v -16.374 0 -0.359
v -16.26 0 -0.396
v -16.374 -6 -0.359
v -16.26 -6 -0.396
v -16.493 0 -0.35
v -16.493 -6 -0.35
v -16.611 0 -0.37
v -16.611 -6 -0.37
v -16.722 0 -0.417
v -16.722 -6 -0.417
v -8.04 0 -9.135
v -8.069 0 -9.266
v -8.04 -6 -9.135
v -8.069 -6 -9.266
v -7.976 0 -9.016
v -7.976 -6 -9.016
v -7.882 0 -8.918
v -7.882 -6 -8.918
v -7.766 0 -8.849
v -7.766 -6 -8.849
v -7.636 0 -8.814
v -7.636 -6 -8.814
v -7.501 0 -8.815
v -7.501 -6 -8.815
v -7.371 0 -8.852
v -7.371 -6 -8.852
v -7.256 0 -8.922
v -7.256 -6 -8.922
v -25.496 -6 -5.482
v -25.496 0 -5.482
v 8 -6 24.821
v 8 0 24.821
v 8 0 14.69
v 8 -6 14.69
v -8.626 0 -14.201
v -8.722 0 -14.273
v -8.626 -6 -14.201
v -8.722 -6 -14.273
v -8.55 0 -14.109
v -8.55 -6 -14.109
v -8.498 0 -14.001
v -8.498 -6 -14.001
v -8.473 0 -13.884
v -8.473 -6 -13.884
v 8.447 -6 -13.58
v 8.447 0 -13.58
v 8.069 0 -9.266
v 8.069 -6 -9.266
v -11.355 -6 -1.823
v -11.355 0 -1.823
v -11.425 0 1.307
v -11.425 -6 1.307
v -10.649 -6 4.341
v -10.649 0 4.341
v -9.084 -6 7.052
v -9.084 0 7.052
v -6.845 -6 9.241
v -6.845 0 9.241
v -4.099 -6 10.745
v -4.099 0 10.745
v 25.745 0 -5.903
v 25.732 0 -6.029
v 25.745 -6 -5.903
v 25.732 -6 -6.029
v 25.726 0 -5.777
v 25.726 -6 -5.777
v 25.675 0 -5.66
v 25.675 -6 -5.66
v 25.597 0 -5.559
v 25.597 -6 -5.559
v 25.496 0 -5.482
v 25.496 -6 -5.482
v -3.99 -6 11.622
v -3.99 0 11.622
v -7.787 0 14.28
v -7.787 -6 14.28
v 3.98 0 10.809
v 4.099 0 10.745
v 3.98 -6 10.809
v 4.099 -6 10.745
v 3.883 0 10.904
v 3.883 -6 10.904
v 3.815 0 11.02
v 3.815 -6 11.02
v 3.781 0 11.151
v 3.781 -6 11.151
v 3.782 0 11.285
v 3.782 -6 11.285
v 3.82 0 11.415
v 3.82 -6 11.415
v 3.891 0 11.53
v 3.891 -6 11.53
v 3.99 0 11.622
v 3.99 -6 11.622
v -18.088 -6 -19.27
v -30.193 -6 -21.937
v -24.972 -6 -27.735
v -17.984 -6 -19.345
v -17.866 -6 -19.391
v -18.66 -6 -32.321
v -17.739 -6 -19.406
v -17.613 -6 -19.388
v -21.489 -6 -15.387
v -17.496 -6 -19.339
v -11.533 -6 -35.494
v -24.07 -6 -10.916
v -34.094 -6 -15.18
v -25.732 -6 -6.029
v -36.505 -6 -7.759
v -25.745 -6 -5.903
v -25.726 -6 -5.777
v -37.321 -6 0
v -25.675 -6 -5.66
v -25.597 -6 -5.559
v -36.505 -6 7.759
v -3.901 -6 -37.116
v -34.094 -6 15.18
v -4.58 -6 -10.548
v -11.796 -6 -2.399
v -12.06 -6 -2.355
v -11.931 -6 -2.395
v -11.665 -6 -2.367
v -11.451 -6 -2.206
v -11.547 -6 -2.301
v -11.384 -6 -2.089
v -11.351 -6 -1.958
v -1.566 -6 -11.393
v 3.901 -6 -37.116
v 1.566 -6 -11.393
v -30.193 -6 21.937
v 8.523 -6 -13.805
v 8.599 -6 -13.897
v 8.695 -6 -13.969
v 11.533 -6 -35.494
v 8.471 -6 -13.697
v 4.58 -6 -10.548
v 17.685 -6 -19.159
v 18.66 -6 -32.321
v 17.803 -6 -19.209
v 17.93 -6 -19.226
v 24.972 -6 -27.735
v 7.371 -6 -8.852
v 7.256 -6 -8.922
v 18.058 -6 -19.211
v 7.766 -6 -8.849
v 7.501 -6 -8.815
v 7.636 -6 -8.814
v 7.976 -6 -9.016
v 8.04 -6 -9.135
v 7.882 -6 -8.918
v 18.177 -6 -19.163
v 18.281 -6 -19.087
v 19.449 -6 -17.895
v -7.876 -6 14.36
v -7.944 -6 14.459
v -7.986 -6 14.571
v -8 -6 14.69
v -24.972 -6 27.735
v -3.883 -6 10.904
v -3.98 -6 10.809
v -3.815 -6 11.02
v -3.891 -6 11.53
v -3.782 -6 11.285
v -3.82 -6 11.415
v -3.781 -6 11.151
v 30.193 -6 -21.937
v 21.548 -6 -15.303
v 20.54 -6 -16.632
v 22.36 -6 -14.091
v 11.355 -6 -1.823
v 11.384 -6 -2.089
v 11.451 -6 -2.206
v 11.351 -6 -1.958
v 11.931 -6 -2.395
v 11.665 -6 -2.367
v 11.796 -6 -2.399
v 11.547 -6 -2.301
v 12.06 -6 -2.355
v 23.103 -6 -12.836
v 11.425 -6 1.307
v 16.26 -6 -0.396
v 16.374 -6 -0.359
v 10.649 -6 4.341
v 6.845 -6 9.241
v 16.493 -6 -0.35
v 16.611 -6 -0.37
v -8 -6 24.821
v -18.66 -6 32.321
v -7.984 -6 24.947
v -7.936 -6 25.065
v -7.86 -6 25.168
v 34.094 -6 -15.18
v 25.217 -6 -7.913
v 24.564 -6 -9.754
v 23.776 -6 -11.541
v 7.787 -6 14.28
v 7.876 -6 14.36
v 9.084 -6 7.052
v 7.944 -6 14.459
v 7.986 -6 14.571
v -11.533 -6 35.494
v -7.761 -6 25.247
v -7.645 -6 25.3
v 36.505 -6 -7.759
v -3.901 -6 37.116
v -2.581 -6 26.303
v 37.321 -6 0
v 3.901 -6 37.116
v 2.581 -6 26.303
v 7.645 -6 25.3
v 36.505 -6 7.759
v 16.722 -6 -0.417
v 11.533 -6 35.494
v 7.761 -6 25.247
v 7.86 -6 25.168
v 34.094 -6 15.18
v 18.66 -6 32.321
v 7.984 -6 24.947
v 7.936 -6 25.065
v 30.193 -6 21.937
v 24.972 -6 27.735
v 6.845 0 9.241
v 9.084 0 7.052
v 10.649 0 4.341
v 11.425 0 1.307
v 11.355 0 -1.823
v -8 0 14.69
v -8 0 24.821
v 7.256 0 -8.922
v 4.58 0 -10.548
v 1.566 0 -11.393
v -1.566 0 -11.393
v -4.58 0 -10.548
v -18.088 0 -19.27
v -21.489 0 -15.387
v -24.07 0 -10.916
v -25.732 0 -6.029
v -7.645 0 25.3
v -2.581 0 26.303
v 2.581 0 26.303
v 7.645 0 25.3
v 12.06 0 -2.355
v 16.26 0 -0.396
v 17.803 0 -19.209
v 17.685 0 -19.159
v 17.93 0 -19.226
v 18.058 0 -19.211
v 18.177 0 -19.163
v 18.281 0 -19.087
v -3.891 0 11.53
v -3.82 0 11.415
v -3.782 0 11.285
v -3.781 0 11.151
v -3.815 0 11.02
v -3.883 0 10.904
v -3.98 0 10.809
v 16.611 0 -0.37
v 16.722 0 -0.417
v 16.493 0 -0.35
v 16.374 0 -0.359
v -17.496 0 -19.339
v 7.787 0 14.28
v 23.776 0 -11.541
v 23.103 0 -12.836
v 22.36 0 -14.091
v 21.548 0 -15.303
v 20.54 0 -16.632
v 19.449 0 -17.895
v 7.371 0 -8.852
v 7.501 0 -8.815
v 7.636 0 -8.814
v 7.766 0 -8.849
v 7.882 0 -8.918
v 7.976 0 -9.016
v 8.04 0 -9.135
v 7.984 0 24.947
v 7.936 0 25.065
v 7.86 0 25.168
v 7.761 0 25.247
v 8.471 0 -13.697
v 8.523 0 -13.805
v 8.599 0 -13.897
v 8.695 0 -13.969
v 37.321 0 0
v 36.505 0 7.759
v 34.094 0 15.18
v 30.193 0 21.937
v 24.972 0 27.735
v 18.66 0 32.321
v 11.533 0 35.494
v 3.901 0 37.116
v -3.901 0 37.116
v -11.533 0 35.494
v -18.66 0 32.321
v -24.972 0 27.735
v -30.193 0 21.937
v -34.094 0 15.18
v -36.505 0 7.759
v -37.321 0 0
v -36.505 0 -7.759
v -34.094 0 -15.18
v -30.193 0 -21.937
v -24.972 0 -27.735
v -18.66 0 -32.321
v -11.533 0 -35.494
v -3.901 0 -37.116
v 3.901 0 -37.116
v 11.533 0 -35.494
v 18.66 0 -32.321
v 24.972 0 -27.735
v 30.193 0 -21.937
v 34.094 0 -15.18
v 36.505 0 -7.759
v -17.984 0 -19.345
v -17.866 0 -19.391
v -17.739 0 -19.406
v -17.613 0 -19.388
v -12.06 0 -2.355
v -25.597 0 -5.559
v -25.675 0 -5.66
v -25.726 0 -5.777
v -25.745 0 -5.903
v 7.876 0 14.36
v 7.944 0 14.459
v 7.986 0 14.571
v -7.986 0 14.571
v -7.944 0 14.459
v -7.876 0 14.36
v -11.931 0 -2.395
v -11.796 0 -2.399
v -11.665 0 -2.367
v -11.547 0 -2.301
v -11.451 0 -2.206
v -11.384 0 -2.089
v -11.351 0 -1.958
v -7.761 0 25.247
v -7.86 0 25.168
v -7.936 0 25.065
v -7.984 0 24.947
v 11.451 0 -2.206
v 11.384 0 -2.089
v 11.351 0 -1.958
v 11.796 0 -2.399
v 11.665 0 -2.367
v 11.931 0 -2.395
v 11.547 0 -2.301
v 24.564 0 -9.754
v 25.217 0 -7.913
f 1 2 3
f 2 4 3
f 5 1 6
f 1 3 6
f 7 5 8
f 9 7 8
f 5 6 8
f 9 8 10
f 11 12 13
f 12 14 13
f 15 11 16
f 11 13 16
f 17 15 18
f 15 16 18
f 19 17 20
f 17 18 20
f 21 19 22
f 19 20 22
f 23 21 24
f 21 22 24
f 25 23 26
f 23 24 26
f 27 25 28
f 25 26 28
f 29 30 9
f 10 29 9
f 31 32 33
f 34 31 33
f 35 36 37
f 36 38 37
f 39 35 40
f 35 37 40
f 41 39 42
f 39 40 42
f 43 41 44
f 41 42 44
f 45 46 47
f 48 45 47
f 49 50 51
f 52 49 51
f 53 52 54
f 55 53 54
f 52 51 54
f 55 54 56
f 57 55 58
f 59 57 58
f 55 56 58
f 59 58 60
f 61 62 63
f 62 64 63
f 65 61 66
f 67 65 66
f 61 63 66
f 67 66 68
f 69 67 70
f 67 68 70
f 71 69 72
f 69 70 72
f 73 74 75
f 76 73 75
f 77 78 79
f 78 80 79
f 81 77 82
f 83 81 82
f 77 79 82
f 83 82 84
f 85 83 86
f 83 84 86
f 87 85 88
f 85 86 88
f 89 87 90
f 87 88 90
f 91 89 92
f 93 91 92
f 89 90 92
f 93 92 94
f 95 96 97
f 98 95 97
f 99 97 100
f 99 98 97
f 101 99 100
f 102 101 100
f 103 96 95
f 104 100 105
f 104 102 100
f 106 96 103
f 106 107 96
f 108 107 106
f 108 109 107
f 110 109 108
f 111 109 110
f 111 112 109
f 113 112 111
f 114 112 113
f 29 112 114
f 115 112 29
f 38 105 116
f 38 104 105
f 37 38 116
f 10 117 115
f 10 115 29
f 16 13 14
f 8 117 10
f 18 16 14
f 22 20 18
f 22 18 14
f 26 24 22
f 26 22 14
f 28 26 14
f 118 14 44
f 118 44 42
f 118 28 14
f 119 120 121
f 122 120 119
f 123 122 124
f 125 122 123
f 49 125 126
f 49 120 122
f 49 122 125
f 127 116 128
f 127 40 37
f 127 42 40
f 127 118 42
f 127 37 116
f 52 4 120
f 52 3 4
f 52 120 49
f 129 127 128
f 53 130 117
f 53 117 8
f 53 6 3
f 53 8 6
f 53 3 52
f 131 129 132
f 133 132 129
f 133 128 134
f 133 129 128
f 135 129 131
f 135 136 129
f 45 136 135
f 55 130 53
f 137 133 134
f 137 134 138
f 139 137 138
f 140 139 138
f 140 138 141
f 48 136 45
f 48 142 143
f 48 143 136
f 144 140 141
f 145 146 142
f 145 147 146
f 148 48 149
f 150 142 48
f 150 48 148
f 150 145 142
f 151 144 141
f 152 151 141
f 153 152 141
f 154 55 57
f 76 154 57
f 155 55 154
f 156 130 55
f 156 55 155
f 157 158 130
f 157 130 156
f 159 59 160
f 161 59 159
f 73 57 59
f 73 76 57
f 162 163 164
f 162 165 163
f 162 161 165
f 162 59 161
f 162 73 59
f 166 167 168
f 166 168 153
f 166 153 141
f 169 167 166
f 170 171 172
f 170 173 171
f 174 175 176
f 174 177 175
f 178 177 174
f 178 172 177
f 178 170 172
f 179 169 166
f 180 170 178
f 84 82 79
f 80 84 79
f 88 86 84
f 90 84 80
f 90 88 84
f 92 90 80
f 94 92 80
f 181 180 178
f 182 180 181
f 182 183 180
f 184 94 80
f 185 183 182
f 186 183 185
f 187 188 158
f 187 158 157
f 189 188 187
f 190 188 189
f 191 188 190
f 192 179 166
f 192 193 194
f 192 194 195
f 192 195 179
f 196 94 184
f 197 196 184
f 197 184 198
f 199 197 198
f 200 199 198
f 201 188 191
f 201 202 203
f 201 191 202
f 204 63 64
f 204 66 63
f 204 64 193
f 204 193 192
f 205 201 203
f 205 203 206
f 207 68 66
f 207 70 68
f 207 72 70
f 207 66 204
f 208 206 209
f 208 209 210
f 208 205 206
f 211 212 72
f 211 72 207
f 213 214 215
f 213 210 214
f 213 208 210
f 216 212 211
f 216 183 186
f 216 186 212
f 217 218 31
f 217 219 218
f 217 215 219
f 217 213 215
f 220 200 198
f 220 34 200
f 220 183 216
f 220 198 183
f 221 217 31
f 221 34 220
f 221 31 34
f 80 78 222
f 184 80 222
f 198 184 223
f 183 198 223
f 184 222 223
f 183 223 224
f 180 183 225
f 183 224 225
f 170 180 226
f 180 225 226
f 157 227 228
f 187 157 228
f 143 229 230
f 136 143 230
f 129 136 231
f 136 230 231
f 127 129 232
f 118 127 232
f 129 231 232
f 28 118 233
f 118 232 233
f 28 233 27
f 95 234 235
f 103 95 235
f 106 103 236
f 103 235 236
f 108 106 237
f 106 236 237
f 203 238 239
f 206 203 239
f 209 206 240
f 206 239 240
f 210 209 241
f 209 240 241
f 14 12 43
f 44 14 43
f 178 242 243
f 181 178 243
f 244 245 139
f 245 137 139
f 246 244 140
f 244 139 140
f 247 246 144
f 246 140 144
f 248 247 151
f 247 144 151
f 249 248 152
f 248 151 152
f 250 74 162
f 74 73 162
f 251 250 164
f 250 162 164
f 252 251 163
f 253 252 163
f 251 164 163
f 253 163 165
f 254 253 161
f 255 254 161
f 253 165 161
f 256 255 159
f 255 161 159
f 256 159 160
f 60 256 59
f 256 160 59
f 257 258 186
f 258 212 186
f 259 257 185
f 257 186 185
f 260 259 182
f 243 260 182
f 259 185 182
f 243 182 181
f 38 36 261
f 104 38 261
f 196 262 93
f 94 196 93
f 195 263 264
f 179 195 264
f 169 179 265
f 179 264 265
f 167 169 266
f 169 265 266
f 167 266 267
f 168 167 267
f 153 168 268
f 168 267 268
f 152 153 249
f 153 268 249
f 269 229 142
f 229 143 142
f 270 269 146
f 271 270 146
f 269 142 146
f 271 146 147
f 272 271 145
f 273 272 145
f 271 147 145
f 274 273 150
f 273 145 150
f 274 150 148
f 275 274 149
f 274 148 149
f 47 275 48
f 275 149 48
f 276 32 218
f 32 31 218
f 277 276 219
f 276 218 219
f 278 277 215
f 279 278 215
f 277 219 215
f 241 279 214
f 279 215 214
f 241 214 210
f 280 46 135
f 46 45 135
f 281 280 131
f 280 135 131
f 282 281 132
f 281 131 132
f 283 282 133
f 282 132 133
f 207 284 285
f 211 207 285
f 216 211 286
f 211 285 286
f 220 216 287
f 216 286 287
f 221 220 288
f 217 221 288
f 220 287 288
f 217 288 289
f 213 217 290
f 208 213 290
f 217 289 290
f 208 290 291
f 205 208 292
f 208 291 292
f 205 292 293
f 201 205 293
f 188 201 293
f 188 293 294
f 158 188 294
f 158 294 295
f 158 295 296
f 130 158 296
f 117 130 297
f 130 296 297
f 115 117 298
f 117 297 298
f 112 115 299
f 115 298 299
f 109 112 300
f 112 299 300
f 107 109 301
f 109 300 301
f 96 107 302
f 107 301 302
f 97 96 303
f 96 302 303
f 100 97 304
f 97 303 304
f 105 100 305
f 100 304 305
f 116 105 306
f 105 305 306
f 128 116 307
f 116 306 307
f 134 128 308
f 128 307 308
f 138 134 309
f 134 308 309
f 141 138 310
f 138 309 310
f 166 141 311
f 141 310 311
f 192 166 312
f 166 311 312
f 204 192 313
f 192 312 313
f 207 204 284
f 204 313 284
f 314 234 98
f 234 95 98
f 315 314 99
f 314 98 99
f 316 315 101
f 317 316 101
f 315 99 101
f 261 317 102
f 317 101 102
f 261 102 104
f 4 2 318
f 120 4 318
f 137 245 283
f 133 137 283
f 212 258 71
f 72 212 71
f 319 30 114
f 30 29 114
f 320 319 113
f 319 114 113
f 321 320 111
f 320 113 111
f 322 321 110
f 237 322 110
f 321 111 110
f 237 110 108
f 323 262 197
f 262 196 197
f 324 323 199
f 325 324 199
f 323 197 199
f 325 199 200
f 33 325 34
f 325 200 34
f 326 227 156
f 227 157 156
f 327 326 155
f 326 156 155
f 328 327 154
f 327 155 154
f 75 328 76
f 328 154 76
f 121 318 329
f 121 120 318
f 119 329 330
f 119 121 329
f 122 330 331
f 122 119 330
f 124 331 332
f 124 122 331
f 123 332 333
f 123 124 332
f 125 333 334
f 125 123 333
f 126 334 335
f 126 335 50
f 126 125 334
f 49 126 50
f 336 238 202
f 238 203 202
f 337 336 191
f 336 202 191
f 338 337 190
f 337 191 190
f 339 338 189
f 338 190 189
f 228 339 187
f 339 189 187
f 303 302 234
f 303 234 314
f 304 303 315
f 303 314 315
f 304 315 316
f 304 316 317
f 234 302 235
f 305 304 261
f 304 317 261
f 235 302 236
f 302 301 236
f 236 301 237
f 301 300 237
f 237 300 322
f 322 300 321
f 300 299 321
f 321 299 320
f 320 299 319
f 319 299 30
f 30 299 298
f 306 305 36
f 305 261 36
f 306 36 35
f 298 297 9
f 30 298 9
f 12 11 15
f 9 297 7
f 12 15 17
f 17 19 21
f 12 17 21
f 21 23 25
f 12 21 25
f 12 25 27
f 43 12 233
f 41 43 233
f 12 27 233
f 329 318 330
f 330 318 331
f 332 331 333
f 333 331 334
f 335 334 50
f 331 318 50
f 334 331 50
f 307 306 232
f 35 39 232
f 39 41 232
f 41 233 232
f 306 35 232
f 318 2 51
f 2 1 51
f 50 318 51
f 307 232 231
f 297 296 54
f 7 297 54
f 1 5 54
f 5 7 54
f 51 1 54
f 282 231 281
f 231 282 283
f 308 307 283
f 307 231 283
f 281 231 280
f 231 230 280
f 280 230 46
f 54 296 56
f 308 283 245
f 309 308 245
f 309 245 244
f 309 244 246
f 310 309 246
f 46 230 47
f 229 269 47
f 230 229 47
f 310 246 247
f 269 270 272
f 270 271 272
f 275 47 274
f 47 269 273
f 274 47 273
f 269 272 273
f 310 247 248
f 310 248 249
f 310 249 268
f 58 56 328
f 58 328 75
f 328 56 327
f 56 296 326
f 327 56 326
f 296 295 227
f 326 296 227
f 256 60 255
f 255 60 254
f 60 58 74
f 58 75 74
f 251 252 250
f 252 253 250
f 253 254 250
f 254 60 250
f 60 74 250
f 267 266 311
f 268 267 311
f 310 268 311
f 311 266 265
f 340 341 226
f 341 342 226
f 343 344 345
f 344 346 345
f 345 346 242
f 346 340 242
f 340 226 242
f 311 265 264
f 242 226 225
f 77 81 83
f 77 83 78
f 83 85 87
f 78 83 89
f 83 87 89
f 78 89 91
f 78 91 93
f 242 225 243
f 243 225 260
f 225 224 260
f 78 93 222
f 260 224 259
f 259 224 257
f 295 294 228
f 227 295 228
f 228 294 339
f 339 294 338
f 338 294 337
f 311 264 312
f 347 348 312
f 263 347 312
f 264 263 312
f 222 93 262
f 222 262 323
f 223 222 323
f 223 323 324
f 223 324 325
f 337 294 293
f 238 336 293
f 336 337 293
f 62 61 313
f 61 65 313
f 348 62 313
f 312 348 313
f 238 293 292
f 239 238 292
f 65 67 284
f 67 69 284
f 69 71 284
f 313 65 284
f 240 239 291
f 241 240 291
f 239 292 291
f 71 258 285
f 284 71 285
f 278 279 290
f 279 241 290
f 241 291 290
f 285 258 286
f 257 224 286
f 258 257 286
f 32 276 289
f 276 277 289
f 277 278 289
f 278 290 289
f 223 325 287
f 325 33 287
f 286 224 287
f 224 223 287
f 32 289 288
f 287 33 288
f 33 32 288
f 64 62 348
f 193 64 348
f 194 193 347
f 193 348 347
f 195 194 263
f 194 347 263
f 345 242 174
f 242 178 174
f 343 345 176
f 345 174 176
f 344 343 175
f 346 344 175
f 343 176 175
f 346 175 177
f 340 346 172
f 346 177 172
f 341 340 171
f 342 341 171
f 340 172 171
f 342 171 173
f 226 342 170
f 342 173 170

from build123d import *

# Parameters (mm, degrees)
F0_R     = 37.3207707479
F1_DEPTH = 6
F2_R     = 0.5


# Not quite as in the source:
# - two fillets or chamfers of one size are made in one step


with BuildPart() as f1:
    # F0 (on Front) → F1 (new body)
    with BuildSketch(Plane.XZ):
        Circle(F0_R)
        with BuildLine():
            ThreePointArc((-11.1602745113, -2.7745761537), (-9.9592921435, 5.75), (-3.1772838218, 11.0523693168))
            Line((-3.1772838218, 11.0523693168), (-8, 14.4292715395))
            Line((-8, 14.4292715395), (-8, 25.1894103565))
            ThreePointArc((-8, 25.1894103565), (0, 26.4292715395), (8, 25.1894103565))
            Line((8, 25.1894103565), (8, 14.4292715395))
            Line((8, 14.4292715395), (3.1772838218, 11.0523693168))
            ThreePointArc((3.1772838218, 11.0523693168), (9.9592921435, 5.75), (11.1602745113, -2.7745761537))
            Line((11.1602745113, -2.7745761537), (16.4961157113, -0.2864325395))
            Line((16.4961157113, -0.2864325395), (25.8146692751, -5.666501948))
            ThreePointArc((25.8146692751, -5.666501948), (24.9687771204, -8.6640962149), (23.7761097196, -11.5413604358))
            ThreePointArc((23.7761097196, -11.5413604358), (22.7401432363, -13.4681951166), (21.5483693449, -15.3027504941))
            ThreePointArc((21.5483693449, -15.3027504941), (19.880834384, -17.4143279602), (18.0072512686, -19.3454205397))
            Line((18.0072512686, -19.3454205397), (8.4695163323, -13.8388067068))
            Line((8.4695163323, -13.8388067068), (7.9829906895, -8.2777931631))
            ThreePointArc((7.9829906895, -8.2777931631), (0, -11.5), (-7.9829906895, -8.2777931631))
            Line((-7.9829906895, -8.2777931631), (-8.4961157113, -14.142839))
            Line((-8.4961157113, -14.142839), (-17.8146692751, -19.5229084085))
            ThreePointArc((-17.8146692751, -19.5229084085), (-22.8884205567, -13.2146357697), (-25.8146692751, -5.666501948))
            Line((-25.8146692751, -5.666501948), (-16.4961157113, -0.2864325395))
            Line((-16.4961157113, -0.2864325395), (-11.1602745113, -2.7745761537))
        make_face(mode=Mode.SUBTRACT)
    extrude(amount=F1_DEPTH)

    # F2
    f2_edges = [f1.edges().sort_by_distance(p)[0] for p in [
        (-17.814669, -3, -19.522908),
        (-25.814669, -3, -5.666502),
        (-8.496116, -3, -14.142839),
        (-7.982991, -3, -8.277793),
        (7.982991, -3, -8.277793),
        (8.469516, -3, -13.838807),
        (18.007251, -3, -19.345421),
        (25.814669, -3, -5.666502),
        (16.496116, -3, -0.286433),
        (11.160275, -3, -2.774576),
        (3.177284, -3, 11.052369),
        (8, -3, 14.429272),
        (8, -3, 25.18941),
        (-8, -3, 25.18941),
        (-8, -3, 14.429272),
        (-3.177284, -3, 11.052369),
        (-11.160275, -3, -2.774576),
        (-16.496116, -3, -0.286433),
    ]]
    fillet(f2_edges, radius=F2_R)


solid = f1.part
